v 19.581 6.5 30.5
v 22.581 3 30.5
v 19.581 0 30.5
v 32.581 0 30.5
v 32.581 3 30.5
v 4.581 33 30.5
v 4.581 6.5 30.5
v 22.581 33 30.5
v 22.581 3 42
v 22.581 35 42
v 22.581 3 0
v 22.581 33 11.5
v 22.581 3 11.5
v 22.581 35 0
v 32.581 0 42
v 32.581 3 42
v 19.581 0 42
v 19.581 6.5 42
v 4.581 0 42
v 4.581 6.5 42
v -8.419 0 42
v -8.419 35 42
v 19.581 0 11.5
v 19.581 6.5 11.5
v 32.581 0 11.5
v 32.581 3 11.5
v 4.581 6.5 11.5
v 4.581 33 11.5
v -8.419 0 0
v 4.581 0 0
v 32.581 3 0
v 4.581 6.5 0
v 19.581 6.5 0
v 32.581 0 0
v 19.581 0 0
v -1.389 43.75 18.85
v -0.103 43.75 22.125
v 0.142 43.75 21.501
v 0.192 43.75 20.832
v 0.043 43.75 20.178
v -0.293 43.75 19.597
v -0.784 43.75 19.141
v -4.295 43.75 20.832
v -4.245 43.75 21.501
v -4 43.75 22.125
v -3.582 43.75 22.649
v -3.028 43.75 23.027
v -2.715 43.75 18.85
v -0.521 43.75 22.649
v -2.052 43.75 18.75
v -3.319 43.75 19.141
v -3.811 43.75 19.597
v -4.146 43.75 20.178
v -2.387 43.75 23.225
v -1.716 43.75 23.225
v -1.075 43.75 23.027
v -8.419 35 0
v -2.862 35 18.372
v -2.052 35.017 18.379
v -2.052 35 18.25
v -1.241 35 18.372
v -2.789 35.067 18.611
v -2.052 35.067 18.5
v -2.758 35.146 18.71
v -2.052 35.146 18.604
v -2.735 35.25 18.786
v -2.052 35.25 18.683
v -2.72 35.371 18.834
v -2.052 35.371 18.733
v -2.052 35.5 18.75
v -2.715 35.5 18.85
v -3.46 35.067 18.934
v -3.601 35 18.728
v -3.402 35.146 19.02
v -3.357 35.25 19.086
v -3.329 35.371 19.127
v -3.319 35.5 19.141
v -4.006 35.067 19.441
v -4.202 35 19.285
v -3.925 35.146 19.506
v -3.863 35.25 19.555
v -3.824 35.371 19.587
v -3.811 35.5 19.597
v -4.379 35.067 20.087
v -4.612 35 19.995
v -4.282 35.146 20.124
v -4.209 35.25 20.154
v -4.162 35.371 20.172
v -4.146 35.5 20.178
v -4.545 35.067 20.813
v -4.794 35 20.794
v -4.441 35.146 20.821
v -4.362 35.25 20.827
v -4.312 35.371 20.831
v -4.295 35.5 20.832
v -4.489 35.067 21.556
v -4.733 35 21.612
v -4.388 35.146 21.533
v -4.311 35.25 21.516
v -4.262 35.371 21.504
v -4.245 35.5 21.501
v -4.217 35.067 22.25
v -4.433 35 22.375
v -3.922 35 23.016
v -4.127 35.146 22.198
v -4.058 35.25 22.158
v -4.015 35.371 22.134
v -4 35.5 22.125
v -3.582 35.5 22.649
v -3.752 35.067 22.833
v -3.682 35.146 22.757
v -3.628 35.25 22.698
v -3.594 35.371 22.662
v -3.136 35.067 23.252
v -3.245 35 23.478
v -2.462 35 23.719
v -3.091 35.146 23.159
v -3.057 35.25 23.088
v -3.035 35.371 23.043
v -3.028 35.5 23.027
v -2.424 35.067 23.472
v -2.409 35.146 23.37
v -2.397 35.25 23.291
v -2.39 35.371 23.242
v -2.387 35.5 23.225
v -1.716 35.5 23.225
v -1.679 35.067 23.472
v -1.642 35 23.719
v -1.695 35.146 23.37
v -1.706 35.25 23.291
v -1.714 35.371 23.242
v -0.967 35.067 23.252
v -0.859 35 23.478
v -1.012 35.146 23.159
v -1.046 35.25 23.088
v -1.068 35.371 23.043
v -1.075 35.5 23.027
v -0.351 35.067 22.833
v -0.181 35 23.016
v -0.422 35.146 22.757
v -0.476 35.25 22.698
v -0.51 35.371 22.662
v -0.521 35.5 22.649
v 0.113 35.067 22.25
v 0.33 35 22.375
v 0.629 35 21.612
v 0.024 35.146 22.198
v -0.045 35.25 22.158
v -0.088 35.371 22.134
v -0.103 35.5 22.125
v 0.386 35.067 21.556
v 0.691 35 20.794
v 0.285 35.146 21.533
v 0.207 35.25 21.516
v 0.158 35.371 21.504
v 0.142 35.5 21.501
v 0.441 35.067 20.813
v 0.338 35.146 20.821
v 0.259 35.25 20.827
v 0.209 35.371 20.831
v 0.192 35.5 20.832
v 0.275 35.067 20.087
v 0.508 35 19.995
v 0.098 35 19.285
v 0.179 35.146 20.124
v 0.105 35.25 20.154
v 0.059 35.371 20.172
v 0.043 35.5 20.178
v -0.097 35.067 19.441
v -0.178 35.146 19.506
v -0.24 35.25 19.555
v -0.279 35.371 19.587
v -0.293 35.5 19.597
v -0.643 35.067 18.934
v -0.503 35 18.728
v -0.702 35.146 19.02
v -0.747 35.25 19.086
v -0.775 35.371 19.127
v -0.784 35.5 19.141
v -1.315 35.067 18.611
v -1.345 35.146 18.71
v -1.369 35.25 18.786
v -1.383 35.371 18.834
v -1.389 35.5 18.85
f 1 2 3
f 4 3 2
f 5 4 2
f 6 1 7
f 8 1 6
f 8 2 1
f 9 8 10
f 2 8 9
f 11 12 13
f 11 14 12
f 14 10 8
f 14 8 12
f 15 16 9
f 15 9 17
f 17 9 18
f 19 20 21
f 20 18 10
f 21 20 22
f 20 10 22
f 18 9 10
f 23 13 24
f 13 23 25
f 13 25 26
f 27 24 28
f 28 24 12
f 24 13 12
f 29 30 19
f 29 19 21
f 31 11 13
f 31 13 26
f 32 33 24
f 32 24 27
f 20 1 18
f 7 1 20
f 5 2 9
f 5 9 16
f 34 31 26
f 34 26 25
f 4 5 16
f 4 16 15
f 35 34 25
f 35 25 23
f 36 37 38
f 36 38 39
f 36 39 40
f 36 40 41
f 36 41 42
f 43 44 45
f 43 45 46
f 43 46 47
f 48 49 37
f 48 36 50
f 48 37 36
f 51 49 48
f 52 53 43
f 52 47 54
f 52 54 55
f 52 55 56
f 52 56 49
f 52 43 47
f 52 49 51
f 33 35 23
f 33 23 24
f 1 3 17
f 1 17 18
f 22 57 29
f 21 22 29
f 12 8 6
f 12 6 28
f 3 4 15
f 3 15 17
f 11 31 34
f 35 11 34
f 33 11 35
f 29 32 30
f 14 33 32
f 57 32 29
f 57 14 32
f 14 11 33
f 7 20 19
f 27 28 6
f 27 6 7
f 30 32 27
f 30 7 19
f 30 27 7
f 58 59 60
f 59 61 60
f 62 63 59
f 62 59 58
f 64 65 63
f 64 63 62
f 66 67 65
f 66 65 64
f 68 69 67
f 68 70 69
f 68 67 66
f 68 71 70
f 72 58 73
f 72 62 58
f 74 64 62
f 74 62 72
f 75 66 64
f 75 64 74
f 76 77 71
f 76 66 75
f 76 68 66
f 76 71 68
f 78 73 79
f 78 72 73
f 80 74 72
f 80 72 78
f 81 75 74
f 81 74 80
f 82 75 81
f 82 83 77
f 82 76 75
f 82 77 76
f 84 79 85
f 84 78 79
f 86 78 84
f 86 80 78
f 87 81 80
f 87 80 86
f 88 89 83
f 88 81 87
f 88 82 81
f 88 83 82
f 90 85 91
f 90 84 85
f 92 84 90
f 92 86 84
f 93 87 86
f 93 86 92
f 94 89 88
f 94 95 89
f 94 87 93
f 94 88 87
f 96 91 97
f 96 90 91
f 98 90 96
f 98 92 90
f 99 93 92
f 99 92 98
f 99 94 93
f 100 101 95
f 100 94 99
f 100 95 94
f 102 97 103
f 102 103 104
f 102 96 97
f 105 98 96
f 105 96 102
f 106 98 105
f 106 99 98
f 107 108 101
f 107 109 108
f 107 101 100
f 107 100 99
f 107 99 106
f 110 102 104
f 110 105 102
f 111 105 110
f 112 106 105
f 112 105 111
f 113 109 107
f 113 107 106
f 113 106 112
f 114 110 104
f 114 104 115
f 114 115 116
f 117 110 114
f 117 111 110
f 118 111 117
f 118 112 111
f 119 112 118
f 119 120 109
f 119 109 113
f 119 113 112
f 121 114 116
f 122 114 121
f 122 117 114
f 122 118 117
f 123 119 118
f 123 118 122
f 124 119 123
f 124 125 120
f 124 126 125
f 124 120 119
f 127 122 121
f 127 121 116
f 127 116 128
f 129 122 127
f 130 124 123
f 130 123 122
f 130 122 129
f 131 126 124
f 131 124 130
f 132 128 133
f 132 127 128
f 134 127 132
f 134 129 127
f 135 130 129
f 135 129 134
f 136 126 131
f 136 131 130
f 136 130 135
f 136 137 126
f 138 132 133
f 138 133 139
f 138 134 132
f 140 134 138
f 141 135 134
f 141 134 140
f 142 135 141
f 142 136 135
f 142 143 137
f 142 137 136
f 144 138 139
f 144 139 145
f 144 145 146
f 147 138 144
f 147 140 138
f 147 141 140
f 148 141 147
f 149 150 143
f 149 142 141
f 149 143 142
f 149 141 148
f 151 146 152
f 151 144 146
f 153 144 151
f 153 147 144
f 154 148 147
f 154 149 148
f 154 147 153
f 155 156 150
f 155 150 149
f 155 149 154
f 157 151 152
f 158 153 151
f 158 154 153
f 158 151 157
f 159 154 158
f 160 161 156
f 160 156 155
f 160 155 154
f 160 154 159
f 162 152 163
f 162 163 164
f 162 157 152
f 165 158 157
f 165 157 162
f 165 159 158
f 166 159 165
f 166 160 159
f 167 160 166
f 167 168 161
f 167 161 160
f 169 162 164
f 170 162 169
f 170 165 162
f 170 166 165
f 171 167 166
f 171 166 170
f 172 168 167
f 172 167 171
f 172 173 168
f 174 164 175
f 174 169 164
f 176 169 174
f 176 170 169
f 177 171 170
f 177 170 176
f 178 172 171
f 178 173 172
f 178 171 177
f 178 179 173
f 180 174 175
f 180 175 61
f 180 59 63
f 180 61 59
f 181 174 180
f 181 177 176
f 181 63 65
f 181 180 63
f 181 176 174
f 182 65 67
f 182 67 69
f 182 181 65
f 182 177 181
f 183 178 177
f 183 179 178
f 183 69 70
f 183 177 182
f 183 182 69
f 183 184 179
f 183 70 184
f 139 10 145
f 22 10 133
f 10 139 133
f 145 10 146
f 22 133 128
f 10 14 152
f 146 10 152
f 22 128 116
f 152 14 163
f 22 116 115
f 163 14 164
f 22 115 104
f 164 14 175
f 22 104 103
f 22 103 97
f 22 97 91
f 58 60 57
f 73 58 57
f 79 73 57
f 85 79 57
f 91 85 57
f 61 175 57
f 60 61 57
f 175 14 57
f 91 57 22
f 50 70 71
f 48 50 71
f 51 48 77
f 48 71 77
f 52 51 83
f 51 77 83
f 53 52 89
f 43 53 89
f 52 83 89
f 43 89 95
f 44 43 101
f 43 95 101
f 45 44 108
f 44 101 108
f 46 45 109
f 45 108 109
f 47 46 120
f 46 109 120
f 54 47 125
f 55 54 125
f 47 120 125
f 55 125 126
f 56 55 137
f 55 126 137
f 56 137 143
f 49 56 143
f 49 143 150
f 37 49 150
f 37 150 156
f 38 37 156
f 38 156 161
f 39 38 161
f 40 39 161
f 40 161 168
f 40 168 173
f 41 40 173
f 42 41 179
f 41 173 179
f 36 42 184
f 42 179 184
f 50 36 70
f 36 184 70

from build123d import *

# Parameters (mm, degrees)
BOSS_EXTRUDE1_DEPTH = 42
CUT_EXTRUDE1_REACH  = 70.337
SKETCH2_W           = 19
SKETCH2_H           = 33
SKETCH3_R           = 2.25
BOSS_EXTRUDE2_DEPTH = 8.75
FILLET1_R           = 0.5


with BuildPart() as part:
    # Sketch1 → Boss-Extrude1 (new body)
    with BuildSketch(Plane.XY):
        Polygon((19.580645161, 0), (19.580645161, 6.5), (4.580645161, 6.5), (4.580645161, 0), (-8.419354839, 0), (-8.419354839, 3), (-8.419354839, 35), (1.580645161, 35), (22.580645161, 35), (22.580645161, 3), (32.580645161, 3), (32.580645161, 0), align=None)
    extrude(amount=BOSS_EXTRUDE1_DEPTH)

    # Cut-Extrude1: up to this face of the body (flat: up to its plane)
    cut_extrude1_end = Plane(part.part.faces().sort_by_distance((4.580645161, 3.25, 21))[0])
    # Sketch2 → Cut-Extrude1 (cut, up to the picked face)
    with BuildSketch(Plane(origin=(32.580645161, 0, 0), x_dir=(0, 0, -1), z_dir=(1, 0, 0)), mode=Mode.PRIVATE) as cut_extrude1_sk1:
        with Locations((-21, 16.5)):
            Rectangle(SKETCH2_W, SKETCH2_H)
    cut_extrude1_tool1 = split(extrude(cut_extrude1_sk1.sketch, amount=-CUT_EXTRUDE1_REACH, mode=Mode.PRIVATE), bisect_by=cut_extrude1_end, keep=Keep.BOTH, mode=Mode.PRIVATE)
    add(cut_extrude1_tool1.solids().sort_by(Axis((32.580645, 16.5, 21), (-1, 0, 0)))[0], mode=Mode.SUBTRACT)

    # Sketch3 → Boss-Extrude2 (add)
    with BuildSketch(Plane(origin=(0, 35, 0), x_dir=(1, 0, 0), z_dir=(0, 1, 0))):
        with Locations(Location((-2.051707365, -21, 0), (0, 0, 90))):
            Circle(SKETCH3_R)
    extrude(amount=BOSS_EXTRUDE2_DEPTH)

    # Fillet1
    fillet1_edges = [part.edges().sort_by_distance(p)[0] for p in [
        (-2.051707365, 35, 23.25),
    ]]
    fillet(fillet1_edges, radius=FILLET1_R)


solid = part.part
